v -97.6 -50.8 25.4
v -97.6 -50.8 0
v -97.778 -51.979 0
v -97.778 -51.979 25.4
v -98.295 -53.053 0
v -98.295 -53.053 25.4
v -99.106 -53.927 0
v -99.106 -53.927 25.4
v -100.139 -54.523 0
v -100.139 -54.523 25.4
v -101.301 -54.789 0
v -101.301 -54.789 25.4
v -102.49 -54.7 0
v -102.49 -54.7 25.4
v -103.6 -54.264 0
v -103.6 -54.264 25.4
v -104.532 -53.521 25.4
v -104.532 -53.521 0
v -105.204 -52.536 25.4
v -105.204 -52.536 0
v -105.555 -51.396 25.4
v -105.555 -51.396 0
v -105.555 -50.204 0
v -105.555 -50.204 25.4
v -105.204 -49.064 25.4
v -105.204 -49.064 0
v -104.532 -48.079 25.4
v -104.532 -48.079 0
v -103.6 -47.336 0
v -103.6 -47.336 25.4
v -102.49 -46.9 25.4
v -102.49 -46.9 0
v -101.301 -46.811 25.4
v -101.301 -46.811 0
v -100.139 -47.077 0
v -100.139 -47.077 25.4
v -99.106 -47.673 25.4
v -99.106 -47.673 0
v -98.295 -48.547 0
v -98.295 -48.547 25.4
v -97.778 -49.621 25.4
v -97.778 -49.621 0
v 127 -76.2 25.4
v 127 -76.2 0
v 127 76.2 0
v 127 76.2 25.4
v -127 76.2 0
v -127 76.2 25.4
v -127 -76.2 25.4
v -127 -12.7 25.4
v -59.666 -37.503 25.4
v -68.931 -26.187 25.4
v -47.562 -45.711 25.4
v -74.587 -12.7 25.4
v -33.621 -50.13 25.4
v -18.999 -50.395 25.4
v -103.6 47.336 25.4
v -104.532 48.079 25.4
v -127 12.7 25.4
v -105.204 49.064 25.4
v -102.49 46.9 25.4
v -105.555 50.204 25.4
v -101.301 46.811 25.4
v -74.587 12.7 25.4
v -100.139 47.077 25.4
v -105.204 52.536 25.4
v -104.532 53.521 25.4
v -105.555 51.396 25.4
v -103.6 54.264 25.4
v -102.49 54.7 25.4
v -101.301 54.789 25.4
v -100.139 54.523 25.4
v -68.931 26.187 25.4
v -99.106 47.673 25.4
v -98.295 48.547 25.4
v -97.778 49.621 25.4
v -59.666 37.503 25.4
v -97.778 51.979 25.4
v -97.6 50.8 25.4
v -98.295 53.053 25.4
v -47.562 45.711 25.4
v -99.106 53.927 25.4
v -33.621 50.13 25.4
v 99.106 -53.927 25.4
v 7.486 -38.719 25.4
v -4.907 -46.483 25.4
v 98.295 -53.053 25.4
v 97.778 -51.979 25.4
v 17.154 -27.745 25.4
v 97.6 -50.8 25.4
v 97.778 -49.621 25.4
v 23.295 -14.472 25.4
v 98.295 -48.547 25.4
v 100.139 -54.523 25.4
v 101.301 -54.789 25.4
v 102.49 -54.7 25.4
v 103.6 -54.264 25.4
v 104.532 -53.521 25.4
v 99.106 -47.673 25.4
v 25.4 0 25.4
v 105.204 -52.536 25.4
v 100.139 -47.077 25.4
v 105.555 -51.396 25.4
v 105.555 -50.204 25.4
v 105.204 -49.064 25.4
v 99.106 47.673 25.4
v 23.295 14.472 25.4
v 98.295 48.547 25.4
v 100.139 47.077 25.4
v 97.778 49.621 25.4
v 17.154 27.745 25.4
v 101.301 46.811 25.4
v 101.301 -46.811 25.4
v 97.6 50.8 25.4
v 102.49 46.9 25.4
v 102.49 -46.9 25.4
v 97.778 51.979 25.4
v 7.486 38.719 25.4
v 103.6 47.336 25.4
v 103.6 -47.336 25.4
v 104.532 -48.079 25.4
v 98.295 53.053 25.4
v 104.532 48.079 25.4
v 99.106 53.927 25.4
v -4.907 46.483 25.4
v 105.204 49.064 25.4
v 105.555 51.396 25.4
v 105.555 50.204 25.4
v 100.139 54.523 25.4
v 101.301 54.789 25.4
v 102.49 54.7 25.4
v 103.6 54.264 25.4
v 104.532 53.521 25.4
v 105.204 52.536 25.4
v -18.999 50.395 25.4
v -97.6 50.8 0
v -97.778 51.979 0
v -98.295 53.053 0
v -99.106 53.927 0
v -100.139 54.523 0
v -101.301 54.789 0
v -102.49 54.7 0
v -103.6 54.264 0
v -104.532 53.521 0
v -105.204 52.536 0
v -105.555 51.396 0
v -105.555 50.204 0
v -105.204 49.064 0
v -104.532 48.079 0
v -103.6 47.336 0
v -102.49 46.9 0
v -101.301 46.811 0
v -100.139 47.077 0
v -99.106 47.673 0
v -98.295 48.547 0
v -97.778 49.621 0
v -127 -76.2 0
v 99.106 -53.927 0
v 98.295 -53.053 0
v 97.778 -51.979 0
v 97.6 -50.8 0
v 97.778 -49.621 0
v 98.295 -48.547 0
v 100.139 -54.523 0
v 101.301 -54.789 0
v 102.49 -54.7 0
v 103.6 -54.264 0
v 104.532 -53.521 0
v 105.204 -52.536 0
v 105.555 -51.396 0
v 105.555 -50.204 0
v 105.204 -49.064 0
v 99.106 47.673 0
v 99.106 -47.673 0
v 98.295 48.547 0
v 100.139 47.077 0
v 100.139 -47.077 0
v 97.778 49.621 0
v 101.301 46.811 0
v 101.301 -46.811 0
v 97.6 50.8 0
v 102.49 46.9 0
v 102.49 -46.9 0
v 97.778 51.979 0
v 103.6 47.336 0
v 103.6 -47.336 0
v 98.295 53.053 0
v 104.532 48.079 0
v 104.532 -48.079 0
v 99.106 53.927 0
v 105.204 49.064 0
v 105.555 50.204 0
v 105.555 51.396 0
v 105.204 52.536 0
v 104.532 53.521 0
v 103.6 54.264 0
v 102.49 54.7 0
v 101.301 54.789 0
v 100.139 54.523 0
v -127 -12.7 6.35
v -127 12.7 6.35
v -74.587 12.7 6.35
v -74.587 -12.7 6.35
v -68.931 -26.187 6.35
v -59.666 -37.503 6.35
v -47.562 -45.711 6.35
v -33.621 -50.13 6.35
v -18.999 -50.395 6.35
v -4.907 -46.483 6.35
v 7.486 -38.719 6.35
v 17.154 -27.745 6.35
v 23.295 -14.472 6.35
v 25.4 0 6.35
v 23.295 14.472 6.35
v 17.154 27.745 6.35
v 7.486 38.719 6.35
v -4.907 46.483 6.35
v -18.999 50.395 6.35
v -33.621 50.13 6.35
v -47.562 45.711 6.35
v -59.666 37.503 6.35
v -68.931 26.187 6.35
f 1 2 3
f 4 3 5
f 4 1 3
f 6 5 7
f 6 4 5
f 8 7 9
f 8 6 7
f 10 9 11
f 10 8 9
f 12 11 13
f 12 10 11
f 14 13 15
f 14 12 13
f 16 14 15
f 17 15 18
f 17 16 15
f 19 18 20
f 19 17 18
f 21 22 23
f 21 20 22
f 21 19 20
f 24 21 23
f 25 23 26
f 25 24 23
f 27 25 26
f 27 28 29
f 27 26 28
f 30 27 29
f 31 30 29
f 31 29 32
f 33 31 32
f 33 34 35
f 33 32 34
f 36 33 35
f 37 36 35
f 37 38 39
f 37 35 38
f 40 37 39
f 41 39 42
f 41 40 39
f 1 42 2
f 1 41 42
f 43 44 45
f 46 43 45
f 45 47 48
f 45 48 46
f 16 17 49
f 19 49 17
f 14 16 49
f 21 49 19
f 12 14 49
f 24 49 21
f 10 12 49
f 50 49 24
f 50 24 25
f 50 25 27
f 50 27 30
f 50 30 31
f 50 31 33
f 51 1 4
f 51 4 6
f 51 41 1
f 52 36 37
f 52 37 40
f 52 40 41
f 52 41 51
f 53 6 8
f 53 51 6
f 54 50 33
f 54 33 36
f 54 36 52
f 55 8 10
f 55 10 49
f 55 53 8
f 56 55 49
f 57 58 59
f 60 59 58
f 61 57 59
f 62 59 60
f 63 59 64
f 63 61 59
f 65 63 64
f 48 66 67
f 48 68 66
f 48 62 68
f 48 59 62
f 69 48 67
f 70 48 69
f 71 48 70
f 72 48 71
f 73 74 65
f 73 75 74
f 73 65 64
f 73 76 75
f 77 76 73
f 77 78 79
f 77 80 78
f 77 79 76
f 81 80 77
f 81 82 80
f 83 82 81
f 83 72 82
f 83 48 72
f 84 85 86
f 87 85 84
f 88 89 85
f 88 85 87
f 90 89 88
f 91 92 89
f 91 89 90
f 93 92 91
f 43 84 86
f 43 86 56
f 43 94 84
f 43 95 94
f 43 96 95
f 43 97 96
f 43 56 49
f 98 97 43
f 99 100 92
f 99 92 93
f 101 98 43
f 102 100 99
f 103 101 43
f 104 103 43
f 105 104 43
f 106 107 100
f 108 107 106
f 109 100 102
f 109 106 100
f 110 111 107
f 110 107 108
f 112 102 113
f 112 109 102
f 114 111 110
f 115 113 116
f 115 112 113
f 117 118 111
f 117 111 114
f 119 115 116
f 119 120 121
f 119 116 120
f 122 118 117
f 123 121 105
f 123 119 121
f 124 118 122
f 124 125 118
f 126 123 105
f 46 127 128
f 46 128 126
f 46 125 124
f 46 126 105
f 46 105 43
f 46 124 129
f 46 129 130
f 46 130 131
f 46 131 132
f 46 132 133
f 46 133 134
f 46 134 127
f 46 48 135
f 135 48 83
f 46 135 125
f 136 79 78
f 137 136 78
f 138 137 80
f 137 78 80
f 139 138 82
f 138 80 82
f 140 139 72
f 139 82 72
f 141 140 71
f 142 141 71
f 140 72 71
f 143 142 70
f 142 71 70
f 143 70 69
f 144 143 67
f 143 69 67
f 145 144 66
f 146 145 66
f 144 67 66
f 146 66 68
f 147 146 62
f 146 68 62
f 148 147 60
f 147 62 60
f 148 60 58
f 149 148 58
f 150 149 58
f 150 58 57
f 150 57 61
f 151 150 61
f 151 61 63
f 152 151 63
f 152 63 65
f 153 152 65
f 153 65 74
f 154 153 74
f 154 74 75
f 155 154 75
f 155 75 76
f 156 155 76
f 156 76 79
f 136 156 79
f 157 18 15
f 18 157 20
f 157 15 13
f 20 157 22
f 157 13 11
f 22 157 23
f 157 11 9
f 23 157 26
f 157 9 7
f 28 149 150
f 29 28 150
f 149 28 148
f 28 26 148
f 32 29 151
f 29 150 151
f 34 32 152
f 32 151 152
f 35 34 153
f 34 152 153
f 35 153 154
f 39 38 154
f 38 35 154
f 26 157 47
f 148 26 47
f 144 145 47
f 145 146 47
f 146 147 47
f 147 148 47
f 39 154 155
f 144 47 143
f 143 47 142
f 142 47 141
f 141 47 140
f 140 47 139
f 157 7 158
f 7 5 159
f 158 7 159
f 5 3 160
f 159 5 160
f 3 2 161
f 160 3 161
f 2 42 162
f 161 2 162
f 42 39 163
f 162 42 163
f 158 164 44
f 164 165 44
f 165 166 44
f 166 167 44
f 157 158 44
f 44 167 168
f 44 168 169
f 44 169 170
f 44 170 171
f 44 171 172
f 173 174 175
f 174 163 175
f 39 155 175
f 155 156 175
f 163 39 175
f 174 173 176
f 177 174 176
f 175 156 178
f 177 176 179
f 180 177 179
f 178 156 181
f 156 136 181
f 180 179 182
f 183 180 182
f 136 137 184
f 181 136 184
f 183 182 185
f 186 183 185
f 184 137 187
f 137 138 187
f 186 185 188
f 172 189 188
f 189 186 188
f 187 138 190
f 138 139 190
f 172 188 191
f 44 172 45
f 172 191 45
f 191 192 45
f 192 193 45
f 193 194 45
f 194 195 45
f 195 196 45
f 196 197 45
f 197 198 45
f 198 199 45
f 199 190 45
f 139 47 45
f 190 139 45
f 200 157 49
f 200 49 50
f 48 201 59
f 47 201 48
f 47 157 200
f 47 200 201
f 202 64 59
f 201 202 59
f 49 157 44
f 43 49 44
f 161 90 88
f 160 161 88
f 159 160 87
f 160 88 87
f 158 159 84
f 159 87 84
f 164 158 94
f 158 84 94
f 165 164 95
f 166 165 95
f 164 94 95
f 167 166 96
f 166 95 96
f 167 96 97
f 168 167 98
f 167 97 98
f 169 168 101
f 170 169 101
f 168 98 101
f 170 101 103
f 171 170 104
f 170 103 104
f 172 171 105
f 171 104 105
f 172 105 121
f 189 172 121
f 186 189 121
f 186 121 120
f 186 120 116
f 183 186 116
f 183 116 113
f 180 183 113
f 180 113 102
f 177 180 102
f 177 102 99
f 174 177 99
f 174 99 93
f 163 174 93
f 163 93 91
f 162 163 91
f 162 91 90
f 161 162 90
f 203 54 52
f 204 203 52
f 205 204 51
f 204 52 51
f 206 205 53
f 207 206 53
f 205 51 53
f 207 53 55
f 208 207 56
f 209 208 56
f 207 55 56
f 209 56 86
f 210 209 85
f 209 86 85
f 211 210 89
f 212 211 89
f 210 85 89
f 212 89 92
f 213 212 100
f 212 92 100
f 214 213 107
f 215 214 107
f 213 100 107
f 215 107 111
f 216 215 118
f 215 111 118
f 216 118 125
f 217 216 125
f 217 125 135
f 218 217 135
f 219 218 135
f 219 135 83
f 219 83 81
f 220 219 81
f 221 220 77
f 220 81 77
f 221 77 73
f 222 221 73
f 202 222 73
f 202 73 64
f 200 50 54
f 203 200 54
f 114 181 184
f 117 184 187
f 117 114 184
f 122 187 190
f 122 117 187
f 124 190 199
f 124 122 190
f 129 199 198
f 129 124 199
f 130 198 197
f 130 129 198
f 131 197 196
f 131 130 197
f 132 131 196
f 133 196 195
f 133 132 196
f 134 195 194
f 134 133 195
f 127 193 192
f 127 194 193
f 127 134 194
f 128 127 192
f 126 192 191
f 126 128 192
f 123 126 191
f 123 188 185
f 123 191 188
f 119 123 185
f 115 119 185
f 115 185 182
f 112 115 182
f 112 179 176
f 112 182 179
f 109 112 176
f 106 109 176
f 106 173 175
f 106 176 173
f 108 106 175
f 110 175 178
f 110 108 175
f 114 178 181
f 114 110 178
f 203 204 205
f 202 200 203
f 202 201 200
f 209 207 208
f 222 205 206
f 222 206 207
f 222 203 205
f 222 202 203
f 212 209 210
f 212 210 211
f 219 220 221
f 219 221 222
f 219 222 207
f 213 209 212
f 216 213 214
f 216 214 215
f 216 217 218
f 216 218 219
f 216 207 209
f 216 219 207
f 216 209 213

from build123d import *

# Parameters (mm, degrees)
SKETCH_W                = 254
SKETCH_H                = 152.4
PAD_DEPTH               = 25.4
SKETCH001_R             = 4
POCKET_DEPTH            = 619.999755
SKETCH001_MIRRORED_2_R  = 4
POCKET_MIRRORED_2_DEPTH = 619.999755
POCKET001_DEPTH         = 19.05


with BuildPart() as part:
    # Sketch → Pad (new body)
    with BuildSketch(Plane.XY):
        Rectangle(SKETCH_W, SKETCH_H)
    extrude(amount=PAD_DEPTH)

    # Sketch001 (on Face6 of Pad) → Pocket (cut, through all)
    with BuildSketch(Plane.XY.offset(25.4)):
        with Locations((-101.6, 50.8)):
            Circle(SKETCH001_R)
    pocket = extrude(amount=-POCKET_DEPTH, mode=Mode.SUBTRACT)

    # Sketch001 Mirrored 2 → Pocket Mirrored 2 (cut, through all)
    with BuildSketch(Plane(origin=(0, 0, 25.4), x_dir=(-1, 0, 0), z_dir=(0, 0, -1))):
        with Locations((-101.6, 50.8)):
            Circle(SKETCH001_MIRRORED_2_R)
    pocket_mirrored_2 = extrude(amount=POCKET_MIRRORED_2_DEPTH, mode=Mode.SUBTRACT)

    # Mirrored001: Pocket, Pocket Mirrored 2 across XZ
    add(pocket.mirror(Plane.XZ), mode=Mode.SUBTRACT)
    add(pocket_mirrored_2.mirror(Plane.XZ), mode=Mode.SUBTRACT)

    # Sketch002 (on Face5 of MultiTransform) → Pocket001 (cut)
    with BuildSketch(Plane.XY.offset(25.4)):
        with BuildLine():
            Line((-127, -12.7), (-74.586888, -12.7))
            ThreePointArc((-74.586888, -12.7), (25.4, 0), (-74.586888, 12.7))
            Line((-74.586888, 12.7), (-127, 12.7))
            Line((-127, 12.7), (-127, -12.7))
        make_face()
    extrude(amount=-POCKET001_DEPTH, mode=Mode.SUBTRACT)


solid = part.part
